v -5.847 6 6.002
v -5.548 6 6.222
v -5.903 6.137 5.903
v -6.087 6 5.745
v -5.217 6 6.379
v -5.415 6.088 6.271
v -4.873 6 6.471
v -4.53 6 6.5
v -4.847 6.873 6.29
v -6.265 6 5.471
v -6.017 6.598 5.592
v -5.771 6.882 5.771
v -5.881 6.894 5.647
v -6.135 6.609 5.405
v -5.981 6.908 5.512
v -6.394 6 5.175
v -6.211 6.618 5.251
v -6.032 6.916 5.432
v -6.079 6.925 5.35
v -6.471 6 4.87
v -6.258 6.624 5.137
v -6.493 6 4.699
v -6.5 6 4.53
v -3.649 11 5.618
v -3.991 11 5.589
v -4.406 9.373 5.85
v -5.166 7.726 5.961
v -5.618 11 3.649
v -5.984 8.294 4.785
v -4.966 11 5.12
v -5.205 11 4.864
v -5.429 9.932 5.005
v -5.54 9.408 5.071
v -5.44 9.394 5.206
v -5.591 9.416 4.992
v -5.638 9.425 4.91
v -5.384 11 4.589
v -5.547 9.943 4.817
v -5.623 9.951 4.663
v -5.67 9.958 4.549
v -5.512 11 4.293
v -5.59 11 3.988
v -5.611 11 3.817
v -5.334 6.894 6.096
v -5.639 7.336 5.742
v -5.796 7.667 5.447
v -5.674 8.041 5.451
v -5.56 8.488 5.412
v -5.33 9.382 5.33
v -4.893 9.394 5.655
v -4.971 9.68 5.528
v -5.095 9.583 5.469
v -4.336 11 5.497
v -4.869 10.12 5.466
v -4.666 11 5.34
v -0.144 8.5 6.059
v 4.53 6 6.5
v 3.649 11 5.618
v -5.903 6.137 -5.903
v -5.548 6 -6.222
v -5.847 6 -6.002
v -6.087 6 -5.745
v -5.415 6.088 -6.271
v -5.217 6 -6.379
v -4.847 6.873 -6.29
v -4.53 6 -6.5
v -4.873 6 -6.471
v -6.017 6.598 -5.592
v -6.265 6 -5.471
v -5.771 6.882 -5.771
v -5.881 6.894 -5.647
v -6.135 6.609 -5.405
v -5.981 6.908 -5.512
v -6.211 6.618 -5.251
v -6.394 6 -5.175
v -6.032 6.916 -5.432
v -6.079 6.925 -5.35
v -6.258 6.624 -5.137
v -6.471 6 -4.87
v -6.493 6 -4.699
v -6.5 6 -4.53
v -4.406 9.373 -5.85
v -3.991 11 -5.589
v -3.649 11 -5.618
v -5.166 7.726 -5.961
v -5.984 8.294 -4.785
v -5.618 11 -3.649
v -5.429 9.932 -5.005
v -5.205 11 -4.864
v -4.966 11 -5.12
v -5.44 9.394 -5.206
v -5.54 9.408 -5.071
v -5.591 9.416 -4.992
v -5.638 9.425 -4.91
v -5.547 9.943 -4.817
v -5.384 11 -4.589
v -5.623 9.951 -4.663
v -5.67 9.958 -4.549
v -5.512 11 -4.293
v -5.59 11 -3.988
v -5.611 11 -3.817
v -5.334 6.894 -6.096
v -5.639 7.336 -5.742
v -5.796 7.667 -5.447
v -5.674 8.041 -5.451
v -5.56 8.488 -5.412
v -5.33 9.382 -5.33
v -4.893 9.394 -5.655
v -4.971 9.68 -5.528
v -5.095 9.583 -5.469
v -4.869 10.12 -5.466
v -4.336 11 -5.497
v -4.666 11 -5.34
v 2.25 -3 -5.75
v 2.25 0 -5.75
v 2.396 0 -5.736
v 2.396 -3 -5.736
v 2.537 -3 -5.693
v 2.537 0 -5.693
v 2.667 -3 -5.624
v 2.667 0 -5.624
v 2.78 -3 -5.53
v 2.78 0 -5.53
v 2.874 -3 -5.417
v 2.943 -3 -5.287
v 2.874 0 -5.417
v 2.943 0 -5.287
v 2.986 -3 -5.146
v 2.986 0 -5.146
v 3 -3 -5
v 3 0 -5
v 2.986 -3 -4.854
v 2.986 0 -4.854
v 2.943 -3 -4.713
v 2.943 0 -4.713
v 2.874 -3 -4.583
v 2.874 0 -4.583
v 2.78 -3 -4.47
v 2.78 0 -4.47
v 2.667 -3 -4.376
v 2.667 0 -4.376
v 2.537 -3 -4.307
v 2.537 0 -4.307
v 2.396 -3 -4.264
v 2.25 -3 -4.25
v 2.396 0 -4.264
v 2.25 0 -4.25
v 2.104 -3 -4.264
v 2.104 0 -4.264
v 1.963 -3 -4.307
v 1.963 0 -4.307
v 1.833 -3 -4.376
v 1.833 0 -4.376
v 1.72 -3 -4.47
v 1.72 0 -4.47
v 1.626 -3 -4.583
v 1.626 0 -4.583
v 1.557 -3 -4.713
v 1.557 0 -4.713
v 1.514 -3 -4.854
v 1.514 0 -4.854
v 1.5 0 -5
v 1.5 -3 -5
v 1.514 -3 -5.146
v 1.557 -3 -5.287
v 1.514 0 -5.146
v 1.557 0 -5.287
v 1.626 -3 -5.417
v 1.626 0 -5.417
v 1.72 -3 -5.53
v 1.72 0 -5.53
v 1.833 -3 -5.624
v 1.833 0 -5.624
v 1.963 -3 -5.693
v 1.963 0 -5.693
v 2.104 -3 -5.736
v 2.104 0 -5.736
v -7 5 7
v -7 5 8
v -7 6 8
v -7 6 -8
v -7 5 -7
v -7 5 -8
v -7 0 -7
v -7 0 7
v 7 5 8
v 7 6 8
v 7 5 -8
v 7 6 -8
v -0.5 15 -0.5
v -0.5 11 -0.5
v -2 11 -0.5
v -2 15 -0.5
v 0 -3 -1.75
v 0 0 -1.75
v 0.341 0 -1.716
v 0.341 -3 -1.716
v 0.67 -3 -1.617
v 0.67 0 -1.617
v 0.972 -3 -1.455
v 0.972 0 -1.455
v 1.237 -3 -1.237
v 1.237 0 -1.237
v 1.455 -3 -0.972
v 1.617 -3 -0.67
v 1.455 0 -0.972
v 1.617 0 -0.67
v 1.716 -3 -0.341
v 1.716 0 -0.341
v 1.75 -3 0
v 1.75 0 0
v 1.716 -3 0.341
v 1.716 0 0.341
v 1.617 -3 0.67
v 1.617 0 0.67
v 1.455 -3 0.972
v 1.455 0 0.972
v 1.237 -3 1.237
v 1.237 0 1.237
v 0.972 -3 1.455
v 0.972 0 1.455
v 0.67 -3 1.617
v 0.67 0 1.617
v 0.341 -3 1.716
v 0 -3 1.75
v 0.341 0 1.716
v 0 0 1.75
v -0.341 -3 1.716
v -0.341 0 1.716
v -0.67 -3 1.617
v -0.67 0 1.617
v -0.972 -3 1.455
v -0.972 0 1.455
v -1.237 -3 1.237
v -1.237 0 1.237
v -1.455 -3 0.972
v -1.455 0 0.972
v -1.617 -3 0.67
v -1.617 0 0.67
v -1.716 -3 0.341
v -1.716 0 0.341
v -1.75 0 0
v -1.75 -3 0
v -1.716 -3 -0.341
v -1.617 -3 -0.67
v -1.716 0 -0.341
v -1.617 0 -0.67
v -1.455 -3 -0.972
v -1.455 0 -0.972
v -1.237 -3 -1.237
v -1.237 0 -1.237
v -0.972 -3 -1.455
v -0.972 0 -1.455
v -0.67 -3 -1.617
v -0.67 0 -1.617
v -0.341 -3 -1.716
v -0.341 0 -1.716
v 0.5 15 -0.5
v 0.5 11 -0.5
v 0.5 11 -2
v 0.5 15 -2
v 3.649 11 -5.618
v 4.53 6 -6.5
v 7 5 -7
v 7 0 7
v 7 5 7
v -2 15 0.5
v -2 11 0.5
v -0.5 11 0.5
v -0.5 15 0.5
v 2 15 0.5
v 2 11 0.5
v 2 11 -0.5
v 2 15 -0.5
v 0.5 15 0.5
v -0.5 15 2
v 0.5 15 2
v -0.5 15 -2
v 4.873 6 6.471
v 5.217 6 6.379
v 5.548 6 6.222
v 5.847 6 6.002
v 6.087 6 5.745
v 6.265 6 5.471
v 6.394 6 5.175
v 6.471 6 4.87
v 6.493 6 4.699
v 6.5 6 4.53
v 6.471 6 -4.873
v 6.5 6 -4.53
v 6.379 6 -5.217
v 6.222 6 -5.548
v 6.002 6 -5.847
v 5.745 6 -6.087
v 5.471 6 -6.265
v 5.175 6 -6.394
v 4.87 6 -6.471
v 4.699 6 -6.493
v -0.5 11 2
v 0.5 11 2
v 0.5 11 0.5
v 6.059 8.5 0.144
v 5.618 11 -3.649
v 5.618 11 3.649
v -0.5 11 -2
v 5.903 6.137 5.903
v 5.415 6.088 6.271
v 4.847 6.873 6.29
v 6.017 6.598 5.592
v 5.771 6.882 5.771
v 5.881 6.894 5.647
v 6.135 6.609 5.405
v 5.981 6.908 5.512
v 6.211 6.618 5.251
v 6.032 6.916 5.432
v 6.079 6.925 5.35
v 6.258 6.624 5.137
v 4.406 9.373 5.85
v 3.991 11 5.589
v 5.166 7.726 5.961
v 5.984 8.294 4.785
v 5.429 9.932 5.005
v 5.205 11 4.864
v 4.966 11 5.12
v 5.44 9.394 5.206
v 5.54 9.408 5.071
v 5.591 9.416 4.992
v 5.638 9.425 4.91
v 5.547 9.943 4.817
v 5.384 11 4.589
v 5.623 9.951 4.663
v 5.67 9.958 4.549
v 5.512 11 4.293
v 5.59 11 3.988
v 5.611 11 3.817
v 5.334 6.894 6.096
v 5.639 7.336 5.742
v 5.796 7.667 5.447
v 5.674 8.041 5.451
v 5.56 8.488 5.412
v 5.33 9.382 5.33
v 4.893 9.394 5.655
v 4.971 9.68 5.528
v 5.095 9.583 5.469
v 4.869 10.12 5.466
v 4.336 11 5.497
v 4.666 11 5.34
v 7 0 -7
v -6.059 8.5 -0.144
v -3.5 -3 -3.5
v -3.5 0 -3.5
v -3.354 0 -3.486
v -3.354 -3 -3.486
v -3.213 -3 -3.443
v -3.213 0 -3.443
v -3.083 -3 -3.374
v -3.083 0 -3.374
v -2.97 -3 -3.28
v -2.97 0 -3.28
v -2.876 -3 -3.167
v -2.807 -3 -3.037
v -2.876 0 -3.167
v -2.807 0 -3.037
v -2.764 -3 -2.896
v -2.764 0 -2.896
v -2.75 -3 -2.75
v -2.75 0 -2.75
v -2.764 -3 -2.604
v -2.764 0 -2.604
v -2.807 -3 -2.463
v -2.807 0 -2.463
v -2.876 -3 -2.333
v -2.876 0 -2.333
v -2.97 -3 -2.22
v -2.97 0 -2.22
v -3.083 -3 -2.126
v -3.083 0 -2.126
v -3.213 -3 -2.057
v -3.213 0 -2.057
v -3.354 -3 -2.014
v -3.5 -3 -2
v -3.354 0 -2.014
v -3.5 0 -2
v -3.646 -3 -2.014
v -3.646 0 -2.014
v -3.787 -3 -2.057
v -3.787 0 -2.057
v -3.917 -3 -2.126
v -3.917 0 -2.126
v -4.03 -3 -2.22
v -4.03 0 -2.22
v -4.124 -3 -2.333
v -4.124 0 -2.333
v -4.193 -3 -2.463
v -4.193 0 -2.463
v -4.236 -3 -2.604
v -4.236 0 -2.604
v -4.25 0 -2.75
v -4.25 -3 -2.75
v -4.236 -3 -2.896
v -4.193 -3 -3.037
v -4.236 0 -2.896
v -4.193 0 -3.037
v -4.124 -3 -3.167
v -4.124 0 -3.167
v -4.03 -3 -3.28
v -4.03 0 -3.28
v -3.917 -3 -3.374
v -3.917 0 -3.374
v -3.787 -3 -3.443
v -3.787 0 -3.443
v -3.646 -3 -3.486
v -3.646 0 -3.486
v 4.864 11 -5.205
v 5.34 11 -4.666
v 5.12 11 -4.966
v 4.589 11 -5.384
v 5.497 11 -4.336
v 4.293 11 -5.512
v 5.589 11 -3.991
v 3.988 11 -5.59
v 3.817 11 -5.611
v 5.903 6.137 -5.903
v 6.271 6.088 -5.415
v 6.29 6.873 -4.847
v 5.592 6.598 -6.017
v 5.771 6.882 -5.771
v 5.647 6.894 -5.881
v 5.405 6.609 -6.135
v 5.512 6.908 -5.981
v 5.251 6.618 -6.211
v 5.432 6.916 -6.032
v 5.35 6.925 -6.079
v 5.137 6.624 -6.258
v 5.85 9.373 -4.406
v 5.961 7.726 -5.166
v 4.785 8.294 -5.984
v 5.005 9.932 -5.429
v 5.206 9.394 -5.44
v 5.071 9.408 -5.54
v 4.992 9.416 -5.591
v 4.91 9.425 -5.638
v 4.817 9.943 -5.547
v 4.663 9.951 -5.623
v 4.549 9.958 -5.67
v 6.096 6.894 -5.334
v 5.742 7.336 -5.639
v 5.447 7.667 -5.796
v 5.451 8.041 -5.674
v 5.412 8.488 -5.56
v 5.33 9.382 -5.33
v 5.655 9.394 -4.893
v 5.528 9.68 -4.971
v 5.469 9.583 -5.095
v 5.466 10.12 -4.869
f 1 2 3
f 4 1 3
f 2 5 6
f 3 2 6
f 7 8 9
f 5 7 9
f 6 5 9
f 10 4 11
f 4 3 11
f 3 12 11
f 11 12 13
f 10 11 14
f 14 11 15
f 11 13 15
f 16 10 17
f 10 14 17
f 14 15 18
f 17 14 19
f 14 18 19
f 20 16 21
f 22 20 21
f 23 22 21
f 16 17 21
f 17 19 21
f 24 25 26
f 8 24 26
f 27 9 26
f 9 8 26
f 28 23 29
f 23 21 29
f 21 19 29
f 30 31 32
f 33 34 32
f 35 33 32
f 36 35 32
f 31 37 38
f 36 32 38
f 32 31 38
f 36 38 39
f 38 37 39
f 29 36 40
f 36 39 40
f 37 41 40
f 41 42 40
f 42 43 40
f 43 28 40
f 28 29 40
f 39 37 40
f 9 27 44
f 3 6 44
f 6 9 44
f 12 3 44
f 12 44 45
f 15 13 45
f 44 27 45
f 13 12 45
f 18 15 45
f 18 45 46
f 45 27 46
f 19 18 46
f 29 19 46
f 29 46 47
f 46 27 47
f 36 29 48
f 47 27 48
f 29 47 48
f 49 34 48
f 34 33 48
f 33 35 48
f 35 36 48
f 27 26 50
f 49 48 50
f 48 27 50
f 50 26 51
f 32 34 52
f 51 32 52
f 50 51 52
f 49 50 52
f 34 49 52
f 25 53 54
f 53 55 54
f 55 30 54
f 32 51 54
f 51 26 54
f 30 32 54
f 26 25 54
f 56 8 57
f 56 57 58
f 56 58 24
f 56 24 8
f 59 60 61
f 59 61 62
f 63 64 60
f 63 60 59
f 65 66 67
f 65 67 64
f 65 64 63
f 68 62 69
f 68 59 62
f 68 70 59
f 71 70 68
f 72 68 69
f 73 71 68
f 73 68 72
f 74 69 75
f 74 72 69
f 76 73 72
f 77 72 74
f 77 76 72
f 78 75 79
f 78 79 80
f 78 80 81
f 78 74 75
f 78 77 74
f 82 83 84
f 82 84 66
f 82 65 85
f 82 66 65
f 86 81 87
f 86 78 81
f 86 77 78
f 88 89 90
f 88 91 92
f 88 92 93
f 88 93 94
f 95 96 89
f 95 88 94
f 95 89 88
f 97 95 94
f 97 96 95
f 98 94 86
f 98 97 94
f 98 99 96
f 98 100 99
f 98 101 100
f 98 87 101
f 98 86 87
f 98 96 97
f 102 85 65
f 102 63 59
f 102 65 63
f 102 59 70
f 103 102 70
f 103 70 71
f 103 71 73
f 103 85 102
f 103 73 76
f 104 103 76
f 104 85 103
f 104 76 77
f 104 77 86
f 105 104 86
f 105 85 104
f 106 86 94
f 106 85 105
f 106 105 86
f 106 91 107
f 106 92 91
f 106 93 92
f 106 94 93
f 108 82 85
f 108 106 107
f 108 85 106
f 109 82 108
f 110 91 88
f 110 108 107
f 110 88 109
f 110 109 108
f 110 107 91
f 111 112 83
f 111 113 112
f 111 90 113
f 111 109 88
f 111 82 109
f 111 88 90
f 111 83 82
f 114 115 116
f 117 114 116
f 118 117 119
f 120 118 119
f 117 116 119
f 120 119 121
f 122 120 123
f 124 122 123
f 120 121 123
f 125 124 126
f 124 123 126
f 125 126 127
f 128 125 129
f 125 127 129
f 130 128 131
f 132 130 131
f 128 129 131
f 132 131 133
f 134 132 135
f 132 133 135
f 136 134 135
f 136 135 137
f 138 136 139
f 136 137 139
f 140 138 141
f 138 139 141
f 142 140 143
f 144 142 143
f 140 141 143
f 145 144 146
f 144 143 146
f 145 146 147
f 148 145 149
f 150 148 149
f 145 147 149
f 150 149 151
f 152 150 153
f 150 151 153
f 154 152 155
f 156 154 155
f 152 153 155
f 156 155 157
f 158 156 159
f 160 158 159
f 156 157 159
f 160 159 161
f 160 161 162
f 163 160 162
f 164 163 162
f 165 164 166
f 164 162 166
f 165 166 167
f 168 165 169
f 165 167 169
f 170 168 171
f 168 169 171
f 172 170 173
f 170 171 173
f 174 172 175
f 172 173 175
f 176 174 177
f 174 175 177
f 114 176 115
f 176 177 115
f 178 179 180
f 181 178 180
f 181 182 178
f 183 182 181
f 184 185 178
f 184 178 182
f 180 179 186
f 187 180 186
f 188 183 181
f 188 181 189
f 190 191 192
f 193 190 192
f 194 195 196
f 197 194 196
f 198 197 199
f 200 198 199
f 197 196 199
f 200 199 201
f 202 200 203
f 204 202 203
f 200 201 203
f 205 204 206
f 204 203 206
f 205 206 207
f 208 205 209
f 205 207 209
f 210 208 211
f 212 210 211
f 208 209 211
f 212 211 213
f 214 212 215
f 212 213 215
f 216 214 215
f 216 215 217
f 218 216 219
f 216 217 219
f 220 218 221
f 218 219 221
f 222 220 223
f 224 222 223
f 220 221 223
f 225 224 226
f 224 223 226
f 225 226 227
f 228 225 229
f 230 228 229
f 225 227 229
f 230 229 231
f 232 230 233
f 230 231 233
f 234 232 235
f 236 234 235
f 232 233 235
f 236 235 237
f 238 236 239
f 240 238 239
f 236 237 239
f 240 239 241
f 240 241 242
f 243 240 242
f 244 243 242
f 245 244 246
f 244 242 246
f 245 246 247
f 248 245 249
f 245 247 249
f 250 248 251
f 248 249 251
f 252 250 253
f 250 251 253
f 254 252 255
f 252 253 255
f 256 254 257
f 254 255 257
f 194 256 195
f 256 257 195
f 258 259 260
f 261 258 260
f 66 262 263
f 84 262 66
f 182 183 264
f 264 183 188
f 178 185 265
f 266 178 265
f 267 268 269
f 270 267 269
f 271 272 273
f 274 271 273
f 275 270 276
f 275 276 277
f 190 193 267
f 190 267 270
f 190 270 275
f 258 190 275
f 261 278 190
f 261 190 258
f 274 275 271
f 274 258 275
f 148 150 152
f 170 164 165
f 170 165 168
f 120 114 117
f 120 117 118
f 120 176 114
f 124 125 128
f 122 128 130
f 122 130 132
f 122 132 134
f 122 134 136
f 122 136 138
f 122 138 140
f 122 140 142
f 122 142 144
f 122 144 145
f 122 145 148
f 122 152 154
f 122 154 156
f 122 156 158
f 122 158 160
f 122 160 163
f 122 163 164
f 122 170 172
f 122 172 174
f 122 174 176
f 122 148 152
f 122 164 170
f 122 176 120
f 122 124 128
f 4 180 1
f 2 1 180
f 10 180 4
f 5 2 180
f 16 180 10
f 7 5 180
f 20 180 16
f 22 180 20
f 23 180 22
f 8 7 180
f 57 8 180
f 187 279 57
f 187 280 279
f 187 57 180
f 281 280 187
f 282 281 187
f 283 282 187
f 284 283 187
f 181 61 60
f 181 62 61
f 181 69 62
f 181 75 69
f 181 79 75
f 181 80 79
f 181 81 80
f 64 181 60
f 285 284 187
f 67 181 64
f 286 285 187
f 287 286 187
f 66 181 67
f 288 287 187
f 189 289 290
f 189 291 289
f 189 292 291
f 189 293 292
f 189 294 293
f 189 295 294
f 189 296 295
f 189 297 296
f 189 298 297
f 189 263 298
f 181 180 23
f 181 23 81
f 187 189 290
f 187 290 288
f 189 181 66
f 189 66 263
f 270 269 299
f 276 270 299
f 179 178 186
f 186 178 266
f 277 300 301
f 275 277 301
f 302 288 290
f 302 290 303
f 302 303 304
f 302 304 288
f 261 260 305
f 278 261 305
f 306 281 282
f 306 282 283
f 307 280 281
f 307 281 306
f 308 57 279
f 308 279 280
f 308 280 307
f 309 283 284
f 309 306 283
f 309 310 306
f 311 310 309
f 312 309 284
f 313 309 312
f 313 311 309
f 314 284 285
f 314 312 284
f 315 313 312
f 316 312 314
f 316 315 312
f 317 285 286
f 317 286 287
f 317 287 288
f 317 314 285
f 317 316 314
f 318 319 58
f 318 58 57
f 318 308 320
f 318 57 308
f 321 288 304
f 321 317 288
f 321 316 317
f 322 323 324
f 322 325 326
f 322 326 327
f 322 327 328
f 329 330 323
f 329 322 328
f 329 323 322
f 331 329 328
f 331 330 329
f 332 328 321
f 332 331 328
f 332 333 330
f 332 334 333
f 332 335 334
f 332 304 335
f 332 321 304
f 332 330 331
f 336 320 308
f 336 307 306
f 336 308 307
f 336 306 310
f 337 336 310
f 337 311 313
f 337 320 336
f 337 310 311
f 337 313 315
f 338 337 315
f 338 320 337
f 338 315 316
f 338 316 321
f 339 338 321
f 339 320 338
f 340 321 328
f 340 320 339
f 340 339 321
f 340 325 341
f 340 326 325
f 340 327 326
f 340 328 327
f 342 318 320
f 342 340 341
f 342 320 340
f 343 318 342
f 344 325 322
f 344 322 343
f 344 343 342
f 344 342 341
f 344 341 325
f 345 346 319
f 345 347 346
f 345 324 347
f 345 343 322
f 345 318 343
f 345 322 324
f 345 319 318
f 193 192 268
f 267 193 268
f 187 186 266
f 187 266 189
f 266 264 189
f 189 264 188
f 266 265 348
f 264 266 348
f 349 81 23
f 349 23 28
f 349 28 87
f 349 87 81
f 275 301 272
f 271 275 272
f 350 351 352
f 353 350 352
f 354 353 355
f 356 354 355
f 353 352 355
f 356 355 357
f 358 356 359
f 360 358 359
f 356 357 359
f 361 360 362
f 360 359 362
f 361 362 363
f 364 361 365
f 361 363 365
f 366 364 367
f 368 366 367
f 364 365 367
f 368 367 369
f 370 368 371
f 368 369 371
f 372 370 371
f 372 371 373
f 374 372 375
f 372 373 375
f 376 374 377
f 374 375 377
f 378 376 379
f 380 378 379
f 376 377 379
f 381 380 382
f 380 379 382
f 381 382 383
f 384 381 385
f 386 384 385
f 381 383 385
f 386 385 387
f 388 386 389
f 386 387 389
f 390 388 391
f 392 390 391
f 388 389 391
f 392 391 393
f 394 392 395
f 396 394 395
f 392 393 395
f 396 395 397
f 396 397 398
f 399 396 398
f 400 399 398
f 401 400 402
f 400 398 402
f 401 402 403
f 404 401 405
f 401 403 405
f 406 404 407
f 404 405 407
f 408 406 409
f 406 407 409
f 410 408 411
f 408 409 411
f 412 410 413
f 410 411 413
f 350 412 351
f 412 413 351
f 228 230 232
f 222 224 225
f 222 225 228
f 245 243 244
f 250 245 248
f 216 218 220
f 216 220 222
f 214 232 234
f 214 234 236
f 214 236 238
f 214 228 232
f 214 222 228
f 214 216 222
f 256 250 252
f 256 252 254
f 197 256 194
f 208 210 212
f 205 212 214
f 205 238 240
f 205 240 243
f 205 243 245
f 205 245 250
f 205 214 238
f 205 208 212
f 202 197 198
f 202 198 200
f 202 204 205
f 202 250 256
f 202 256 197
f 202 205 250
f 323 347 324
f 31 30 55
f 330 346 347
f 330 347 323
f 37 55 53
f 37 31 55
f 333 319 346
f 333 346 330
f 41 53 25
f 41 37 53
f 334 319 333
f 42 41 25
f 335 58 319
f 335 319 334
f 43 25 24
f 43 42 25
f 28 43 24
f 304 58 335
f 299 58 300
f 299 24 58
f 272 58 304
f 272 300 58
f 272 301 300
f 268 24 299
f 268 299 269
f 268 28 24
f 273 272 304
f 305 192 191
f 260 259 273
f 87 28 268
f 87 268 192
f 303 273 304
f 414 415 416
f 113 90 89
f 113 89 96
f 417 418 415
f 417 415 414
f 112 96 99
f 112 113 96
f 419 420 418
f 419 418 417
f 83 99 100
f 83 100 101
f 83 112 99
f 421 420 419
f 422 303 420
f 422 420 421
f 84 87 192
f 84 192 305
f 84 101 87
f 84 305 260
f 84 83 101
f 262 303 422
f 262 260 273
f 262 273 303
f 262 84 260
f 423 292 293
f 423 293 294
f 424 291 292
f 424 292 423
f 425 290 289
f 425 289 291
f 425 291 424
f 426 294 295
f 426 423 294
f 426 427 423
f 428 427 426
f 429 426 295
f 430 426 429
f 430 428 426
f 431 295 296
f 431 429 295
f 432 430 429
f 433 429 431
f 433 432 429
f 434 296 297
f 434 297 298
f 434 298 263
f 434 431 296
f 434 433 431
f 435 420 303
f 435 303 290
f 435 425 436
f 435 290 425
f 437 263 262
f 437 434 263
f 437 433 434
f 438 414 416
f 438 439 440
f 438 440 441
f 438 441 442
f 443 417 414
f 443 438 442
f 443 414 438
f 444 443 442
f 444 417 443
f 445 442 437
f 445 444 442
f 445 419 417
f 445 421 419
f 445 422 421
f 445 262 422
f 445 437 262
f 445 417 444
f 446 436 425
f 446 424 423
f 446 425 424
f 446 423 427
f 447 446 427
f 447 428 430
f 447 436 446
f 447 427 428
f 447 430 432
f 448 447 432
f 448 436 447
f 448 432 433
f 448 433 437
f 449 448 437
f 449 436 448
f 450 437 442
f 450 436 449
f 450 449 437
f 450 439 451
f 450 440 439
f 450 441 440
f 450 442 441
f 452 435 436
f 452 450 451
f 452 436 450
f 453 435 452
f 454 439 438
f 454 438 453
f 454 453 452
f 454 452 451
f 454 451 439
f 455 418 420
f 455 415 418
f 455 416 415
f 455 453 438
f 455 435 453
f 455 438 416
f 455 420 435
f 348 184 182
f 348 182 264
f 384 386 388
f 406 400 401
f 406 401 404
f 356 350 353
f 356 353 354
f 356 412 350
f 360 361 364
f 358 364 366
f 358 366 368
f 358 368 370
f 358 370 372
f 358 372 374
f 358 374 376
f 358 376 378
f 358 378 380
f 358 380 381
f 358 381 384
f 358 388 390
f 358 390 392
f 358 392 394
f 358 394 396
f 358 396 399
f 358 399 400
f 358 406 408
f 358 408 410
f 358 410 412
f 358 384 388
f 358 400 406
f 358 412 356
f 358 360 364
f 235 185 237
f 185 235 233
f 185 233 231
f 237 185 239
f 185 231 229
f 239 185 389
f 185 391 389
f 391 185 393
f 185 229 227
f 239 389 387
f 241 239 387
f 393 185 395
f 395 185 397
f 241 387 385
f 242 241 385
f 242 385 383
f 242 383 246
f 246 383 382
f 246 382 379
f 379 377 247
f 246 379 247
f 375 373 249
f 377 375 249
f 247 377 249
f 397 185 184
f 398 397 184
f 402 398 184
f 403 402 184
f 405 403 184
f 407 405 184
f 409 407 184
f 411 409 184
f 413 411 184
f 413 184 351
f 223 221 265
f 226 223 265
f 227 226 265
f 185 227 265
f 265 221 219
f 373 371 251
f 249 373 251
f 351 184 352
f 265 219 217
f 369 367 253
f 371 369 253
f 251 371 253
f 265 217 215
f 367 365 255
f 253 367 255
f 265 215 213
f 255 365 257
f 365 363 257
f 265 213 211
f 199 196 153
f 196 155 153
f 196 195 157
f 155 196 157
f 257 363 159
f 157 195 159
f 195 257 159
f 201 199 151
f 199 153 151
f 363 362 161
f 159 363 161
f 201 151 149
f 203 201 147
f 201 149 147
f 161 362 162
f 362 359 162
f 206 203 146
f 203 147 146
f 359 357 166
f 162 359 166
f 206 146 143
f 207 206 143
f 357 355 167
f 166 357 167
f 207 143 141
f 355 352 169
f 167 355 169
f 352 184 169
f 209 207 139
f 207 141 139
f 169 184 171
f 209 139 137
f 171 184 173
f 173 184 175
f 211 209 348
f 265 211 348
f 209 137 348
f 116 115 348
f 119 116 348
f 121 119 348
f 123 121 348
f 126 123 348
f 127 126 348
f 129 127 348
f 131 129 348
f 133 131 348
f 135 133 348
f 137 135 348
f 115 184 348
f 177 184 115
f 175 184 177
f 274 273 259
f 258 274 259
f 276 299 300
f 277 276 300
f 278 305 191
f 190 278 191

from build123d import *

# Parameters (mm, degrees)
SKETCH1_W           = 14
SKETCH1_H           = 14
BOSS_EXTRUDE1_DEPTH = 5
SKETCH2_W           = 14
SKETCH2_H           = 16
BOSS_EXTRUDE2_DEPTH = 1
SKETCH3_W           = 13
SKETCH3_H           = 13
BOSS_EXTRUDE3_DEPTH = 5
BOSS_EXTRUDE3_TAPER = 10
BOSS_EXTRUDE4_DEPTH = 4
SKETCH5_R           = 1.75
BOSS_EXTRUDE5_DEPTH = 3
SKETCH6_R           = 0.75
BOSS_EXTRUDE6_DEPTH = 3
FILLET1_R           = 2


with BuildPart() as part:
    # Sketch1 → Boss-Extrude1 (new body)
    with BuildSketch(Plane(origin=(0, 0, 0), x_dir=(1, 0, 0), z_dir=(0, 1, 0))):
        Rectangle(SKETCH1_W, SKETCH1_H)
    extrude(amount=BOSS_EXTRUDE1_DEPTH)

    # Sketch2 → Boss-Extrude2 (add)
    with BuildSketch(Plane(origin=(0, 5, 0), x_dir=(1, 0, 0), z_dir=(0, 1, 0))):
        Rectangle(SKETCH2_W, SKETCH2_H)
    extrude(amount=BOSS_EXTRUDE2_DEPTH)

    # Sketch3 → Boss-Extrude3 (add)
    with BuildSketch(Plane(origin=(0, 6, 0), x_dir=(1, 0, 0), z_dir=(0, 1, 0))):
        Rectangle(SKETCH3_W, SKETCH3_H)
    extrude(amount=BOSS_EXTRUDE3_DEPTH, taper=BOSS_EXTRUDE3_TAPER)

    # Sketch4 → Boss-Extrude4 (add)
    with BuildSketch(Plane(origin=(0, 11, 0), x_dir=(1, 0, 0), z_dir=(0, 1, 0))):
        Polygon((0.5, -0.5), (2, -0.5), (2, 0.5), (0.5, 0.5), (0.5, 2), (-0.5, 2), (-0.5, 0.5), (-2, 0.5), (-2, -0.5), (-0.5, -0.5), (-0.5, -2), (0.5, -2), align=None)
    extrude(amount=BOSS_EXTRUDE4_DEPTH)

    # Sketch5 → Boss-Extrude5 (add)
    with BuildSketch(Plane.XZ):
        with Locations(Location((0, 0, 0), (0, 0, 270))):
            Circle(SKETCH5_R)
    extrude(amount=BOSS_EXTRUDE5_DEPTH)

    # Sketch6 → Boss-Extrude6 (add)
    with BuildSketch(Plane.XZ):
        with Locations(Location((2.25, -5, 0), (0, 0, 270))):
            Circle(SKETCH6_R)
        with Locations(Location((-3.5, -2.75, 0), (0, 0, 270))):
            Circle(SKETCH6_R)
    extrude(amount=BOSS_EXTRUDE6_DEPTH)

    # Fillet1
    fillet1_edges = [part.edges().sort_by_distance(p)[0] for p in [
        (6.059182548, 8.5, 6.059182548),
        (6.059182548, 8.5, -6.059182548),
        (-6.059182548, 8.5, -6.059182548),
        (-6.059182548, 8.5, 6.059182548),
    ]]
    fillet(fillet1_edges, radius=FILLET1_R)


solid = part.part
